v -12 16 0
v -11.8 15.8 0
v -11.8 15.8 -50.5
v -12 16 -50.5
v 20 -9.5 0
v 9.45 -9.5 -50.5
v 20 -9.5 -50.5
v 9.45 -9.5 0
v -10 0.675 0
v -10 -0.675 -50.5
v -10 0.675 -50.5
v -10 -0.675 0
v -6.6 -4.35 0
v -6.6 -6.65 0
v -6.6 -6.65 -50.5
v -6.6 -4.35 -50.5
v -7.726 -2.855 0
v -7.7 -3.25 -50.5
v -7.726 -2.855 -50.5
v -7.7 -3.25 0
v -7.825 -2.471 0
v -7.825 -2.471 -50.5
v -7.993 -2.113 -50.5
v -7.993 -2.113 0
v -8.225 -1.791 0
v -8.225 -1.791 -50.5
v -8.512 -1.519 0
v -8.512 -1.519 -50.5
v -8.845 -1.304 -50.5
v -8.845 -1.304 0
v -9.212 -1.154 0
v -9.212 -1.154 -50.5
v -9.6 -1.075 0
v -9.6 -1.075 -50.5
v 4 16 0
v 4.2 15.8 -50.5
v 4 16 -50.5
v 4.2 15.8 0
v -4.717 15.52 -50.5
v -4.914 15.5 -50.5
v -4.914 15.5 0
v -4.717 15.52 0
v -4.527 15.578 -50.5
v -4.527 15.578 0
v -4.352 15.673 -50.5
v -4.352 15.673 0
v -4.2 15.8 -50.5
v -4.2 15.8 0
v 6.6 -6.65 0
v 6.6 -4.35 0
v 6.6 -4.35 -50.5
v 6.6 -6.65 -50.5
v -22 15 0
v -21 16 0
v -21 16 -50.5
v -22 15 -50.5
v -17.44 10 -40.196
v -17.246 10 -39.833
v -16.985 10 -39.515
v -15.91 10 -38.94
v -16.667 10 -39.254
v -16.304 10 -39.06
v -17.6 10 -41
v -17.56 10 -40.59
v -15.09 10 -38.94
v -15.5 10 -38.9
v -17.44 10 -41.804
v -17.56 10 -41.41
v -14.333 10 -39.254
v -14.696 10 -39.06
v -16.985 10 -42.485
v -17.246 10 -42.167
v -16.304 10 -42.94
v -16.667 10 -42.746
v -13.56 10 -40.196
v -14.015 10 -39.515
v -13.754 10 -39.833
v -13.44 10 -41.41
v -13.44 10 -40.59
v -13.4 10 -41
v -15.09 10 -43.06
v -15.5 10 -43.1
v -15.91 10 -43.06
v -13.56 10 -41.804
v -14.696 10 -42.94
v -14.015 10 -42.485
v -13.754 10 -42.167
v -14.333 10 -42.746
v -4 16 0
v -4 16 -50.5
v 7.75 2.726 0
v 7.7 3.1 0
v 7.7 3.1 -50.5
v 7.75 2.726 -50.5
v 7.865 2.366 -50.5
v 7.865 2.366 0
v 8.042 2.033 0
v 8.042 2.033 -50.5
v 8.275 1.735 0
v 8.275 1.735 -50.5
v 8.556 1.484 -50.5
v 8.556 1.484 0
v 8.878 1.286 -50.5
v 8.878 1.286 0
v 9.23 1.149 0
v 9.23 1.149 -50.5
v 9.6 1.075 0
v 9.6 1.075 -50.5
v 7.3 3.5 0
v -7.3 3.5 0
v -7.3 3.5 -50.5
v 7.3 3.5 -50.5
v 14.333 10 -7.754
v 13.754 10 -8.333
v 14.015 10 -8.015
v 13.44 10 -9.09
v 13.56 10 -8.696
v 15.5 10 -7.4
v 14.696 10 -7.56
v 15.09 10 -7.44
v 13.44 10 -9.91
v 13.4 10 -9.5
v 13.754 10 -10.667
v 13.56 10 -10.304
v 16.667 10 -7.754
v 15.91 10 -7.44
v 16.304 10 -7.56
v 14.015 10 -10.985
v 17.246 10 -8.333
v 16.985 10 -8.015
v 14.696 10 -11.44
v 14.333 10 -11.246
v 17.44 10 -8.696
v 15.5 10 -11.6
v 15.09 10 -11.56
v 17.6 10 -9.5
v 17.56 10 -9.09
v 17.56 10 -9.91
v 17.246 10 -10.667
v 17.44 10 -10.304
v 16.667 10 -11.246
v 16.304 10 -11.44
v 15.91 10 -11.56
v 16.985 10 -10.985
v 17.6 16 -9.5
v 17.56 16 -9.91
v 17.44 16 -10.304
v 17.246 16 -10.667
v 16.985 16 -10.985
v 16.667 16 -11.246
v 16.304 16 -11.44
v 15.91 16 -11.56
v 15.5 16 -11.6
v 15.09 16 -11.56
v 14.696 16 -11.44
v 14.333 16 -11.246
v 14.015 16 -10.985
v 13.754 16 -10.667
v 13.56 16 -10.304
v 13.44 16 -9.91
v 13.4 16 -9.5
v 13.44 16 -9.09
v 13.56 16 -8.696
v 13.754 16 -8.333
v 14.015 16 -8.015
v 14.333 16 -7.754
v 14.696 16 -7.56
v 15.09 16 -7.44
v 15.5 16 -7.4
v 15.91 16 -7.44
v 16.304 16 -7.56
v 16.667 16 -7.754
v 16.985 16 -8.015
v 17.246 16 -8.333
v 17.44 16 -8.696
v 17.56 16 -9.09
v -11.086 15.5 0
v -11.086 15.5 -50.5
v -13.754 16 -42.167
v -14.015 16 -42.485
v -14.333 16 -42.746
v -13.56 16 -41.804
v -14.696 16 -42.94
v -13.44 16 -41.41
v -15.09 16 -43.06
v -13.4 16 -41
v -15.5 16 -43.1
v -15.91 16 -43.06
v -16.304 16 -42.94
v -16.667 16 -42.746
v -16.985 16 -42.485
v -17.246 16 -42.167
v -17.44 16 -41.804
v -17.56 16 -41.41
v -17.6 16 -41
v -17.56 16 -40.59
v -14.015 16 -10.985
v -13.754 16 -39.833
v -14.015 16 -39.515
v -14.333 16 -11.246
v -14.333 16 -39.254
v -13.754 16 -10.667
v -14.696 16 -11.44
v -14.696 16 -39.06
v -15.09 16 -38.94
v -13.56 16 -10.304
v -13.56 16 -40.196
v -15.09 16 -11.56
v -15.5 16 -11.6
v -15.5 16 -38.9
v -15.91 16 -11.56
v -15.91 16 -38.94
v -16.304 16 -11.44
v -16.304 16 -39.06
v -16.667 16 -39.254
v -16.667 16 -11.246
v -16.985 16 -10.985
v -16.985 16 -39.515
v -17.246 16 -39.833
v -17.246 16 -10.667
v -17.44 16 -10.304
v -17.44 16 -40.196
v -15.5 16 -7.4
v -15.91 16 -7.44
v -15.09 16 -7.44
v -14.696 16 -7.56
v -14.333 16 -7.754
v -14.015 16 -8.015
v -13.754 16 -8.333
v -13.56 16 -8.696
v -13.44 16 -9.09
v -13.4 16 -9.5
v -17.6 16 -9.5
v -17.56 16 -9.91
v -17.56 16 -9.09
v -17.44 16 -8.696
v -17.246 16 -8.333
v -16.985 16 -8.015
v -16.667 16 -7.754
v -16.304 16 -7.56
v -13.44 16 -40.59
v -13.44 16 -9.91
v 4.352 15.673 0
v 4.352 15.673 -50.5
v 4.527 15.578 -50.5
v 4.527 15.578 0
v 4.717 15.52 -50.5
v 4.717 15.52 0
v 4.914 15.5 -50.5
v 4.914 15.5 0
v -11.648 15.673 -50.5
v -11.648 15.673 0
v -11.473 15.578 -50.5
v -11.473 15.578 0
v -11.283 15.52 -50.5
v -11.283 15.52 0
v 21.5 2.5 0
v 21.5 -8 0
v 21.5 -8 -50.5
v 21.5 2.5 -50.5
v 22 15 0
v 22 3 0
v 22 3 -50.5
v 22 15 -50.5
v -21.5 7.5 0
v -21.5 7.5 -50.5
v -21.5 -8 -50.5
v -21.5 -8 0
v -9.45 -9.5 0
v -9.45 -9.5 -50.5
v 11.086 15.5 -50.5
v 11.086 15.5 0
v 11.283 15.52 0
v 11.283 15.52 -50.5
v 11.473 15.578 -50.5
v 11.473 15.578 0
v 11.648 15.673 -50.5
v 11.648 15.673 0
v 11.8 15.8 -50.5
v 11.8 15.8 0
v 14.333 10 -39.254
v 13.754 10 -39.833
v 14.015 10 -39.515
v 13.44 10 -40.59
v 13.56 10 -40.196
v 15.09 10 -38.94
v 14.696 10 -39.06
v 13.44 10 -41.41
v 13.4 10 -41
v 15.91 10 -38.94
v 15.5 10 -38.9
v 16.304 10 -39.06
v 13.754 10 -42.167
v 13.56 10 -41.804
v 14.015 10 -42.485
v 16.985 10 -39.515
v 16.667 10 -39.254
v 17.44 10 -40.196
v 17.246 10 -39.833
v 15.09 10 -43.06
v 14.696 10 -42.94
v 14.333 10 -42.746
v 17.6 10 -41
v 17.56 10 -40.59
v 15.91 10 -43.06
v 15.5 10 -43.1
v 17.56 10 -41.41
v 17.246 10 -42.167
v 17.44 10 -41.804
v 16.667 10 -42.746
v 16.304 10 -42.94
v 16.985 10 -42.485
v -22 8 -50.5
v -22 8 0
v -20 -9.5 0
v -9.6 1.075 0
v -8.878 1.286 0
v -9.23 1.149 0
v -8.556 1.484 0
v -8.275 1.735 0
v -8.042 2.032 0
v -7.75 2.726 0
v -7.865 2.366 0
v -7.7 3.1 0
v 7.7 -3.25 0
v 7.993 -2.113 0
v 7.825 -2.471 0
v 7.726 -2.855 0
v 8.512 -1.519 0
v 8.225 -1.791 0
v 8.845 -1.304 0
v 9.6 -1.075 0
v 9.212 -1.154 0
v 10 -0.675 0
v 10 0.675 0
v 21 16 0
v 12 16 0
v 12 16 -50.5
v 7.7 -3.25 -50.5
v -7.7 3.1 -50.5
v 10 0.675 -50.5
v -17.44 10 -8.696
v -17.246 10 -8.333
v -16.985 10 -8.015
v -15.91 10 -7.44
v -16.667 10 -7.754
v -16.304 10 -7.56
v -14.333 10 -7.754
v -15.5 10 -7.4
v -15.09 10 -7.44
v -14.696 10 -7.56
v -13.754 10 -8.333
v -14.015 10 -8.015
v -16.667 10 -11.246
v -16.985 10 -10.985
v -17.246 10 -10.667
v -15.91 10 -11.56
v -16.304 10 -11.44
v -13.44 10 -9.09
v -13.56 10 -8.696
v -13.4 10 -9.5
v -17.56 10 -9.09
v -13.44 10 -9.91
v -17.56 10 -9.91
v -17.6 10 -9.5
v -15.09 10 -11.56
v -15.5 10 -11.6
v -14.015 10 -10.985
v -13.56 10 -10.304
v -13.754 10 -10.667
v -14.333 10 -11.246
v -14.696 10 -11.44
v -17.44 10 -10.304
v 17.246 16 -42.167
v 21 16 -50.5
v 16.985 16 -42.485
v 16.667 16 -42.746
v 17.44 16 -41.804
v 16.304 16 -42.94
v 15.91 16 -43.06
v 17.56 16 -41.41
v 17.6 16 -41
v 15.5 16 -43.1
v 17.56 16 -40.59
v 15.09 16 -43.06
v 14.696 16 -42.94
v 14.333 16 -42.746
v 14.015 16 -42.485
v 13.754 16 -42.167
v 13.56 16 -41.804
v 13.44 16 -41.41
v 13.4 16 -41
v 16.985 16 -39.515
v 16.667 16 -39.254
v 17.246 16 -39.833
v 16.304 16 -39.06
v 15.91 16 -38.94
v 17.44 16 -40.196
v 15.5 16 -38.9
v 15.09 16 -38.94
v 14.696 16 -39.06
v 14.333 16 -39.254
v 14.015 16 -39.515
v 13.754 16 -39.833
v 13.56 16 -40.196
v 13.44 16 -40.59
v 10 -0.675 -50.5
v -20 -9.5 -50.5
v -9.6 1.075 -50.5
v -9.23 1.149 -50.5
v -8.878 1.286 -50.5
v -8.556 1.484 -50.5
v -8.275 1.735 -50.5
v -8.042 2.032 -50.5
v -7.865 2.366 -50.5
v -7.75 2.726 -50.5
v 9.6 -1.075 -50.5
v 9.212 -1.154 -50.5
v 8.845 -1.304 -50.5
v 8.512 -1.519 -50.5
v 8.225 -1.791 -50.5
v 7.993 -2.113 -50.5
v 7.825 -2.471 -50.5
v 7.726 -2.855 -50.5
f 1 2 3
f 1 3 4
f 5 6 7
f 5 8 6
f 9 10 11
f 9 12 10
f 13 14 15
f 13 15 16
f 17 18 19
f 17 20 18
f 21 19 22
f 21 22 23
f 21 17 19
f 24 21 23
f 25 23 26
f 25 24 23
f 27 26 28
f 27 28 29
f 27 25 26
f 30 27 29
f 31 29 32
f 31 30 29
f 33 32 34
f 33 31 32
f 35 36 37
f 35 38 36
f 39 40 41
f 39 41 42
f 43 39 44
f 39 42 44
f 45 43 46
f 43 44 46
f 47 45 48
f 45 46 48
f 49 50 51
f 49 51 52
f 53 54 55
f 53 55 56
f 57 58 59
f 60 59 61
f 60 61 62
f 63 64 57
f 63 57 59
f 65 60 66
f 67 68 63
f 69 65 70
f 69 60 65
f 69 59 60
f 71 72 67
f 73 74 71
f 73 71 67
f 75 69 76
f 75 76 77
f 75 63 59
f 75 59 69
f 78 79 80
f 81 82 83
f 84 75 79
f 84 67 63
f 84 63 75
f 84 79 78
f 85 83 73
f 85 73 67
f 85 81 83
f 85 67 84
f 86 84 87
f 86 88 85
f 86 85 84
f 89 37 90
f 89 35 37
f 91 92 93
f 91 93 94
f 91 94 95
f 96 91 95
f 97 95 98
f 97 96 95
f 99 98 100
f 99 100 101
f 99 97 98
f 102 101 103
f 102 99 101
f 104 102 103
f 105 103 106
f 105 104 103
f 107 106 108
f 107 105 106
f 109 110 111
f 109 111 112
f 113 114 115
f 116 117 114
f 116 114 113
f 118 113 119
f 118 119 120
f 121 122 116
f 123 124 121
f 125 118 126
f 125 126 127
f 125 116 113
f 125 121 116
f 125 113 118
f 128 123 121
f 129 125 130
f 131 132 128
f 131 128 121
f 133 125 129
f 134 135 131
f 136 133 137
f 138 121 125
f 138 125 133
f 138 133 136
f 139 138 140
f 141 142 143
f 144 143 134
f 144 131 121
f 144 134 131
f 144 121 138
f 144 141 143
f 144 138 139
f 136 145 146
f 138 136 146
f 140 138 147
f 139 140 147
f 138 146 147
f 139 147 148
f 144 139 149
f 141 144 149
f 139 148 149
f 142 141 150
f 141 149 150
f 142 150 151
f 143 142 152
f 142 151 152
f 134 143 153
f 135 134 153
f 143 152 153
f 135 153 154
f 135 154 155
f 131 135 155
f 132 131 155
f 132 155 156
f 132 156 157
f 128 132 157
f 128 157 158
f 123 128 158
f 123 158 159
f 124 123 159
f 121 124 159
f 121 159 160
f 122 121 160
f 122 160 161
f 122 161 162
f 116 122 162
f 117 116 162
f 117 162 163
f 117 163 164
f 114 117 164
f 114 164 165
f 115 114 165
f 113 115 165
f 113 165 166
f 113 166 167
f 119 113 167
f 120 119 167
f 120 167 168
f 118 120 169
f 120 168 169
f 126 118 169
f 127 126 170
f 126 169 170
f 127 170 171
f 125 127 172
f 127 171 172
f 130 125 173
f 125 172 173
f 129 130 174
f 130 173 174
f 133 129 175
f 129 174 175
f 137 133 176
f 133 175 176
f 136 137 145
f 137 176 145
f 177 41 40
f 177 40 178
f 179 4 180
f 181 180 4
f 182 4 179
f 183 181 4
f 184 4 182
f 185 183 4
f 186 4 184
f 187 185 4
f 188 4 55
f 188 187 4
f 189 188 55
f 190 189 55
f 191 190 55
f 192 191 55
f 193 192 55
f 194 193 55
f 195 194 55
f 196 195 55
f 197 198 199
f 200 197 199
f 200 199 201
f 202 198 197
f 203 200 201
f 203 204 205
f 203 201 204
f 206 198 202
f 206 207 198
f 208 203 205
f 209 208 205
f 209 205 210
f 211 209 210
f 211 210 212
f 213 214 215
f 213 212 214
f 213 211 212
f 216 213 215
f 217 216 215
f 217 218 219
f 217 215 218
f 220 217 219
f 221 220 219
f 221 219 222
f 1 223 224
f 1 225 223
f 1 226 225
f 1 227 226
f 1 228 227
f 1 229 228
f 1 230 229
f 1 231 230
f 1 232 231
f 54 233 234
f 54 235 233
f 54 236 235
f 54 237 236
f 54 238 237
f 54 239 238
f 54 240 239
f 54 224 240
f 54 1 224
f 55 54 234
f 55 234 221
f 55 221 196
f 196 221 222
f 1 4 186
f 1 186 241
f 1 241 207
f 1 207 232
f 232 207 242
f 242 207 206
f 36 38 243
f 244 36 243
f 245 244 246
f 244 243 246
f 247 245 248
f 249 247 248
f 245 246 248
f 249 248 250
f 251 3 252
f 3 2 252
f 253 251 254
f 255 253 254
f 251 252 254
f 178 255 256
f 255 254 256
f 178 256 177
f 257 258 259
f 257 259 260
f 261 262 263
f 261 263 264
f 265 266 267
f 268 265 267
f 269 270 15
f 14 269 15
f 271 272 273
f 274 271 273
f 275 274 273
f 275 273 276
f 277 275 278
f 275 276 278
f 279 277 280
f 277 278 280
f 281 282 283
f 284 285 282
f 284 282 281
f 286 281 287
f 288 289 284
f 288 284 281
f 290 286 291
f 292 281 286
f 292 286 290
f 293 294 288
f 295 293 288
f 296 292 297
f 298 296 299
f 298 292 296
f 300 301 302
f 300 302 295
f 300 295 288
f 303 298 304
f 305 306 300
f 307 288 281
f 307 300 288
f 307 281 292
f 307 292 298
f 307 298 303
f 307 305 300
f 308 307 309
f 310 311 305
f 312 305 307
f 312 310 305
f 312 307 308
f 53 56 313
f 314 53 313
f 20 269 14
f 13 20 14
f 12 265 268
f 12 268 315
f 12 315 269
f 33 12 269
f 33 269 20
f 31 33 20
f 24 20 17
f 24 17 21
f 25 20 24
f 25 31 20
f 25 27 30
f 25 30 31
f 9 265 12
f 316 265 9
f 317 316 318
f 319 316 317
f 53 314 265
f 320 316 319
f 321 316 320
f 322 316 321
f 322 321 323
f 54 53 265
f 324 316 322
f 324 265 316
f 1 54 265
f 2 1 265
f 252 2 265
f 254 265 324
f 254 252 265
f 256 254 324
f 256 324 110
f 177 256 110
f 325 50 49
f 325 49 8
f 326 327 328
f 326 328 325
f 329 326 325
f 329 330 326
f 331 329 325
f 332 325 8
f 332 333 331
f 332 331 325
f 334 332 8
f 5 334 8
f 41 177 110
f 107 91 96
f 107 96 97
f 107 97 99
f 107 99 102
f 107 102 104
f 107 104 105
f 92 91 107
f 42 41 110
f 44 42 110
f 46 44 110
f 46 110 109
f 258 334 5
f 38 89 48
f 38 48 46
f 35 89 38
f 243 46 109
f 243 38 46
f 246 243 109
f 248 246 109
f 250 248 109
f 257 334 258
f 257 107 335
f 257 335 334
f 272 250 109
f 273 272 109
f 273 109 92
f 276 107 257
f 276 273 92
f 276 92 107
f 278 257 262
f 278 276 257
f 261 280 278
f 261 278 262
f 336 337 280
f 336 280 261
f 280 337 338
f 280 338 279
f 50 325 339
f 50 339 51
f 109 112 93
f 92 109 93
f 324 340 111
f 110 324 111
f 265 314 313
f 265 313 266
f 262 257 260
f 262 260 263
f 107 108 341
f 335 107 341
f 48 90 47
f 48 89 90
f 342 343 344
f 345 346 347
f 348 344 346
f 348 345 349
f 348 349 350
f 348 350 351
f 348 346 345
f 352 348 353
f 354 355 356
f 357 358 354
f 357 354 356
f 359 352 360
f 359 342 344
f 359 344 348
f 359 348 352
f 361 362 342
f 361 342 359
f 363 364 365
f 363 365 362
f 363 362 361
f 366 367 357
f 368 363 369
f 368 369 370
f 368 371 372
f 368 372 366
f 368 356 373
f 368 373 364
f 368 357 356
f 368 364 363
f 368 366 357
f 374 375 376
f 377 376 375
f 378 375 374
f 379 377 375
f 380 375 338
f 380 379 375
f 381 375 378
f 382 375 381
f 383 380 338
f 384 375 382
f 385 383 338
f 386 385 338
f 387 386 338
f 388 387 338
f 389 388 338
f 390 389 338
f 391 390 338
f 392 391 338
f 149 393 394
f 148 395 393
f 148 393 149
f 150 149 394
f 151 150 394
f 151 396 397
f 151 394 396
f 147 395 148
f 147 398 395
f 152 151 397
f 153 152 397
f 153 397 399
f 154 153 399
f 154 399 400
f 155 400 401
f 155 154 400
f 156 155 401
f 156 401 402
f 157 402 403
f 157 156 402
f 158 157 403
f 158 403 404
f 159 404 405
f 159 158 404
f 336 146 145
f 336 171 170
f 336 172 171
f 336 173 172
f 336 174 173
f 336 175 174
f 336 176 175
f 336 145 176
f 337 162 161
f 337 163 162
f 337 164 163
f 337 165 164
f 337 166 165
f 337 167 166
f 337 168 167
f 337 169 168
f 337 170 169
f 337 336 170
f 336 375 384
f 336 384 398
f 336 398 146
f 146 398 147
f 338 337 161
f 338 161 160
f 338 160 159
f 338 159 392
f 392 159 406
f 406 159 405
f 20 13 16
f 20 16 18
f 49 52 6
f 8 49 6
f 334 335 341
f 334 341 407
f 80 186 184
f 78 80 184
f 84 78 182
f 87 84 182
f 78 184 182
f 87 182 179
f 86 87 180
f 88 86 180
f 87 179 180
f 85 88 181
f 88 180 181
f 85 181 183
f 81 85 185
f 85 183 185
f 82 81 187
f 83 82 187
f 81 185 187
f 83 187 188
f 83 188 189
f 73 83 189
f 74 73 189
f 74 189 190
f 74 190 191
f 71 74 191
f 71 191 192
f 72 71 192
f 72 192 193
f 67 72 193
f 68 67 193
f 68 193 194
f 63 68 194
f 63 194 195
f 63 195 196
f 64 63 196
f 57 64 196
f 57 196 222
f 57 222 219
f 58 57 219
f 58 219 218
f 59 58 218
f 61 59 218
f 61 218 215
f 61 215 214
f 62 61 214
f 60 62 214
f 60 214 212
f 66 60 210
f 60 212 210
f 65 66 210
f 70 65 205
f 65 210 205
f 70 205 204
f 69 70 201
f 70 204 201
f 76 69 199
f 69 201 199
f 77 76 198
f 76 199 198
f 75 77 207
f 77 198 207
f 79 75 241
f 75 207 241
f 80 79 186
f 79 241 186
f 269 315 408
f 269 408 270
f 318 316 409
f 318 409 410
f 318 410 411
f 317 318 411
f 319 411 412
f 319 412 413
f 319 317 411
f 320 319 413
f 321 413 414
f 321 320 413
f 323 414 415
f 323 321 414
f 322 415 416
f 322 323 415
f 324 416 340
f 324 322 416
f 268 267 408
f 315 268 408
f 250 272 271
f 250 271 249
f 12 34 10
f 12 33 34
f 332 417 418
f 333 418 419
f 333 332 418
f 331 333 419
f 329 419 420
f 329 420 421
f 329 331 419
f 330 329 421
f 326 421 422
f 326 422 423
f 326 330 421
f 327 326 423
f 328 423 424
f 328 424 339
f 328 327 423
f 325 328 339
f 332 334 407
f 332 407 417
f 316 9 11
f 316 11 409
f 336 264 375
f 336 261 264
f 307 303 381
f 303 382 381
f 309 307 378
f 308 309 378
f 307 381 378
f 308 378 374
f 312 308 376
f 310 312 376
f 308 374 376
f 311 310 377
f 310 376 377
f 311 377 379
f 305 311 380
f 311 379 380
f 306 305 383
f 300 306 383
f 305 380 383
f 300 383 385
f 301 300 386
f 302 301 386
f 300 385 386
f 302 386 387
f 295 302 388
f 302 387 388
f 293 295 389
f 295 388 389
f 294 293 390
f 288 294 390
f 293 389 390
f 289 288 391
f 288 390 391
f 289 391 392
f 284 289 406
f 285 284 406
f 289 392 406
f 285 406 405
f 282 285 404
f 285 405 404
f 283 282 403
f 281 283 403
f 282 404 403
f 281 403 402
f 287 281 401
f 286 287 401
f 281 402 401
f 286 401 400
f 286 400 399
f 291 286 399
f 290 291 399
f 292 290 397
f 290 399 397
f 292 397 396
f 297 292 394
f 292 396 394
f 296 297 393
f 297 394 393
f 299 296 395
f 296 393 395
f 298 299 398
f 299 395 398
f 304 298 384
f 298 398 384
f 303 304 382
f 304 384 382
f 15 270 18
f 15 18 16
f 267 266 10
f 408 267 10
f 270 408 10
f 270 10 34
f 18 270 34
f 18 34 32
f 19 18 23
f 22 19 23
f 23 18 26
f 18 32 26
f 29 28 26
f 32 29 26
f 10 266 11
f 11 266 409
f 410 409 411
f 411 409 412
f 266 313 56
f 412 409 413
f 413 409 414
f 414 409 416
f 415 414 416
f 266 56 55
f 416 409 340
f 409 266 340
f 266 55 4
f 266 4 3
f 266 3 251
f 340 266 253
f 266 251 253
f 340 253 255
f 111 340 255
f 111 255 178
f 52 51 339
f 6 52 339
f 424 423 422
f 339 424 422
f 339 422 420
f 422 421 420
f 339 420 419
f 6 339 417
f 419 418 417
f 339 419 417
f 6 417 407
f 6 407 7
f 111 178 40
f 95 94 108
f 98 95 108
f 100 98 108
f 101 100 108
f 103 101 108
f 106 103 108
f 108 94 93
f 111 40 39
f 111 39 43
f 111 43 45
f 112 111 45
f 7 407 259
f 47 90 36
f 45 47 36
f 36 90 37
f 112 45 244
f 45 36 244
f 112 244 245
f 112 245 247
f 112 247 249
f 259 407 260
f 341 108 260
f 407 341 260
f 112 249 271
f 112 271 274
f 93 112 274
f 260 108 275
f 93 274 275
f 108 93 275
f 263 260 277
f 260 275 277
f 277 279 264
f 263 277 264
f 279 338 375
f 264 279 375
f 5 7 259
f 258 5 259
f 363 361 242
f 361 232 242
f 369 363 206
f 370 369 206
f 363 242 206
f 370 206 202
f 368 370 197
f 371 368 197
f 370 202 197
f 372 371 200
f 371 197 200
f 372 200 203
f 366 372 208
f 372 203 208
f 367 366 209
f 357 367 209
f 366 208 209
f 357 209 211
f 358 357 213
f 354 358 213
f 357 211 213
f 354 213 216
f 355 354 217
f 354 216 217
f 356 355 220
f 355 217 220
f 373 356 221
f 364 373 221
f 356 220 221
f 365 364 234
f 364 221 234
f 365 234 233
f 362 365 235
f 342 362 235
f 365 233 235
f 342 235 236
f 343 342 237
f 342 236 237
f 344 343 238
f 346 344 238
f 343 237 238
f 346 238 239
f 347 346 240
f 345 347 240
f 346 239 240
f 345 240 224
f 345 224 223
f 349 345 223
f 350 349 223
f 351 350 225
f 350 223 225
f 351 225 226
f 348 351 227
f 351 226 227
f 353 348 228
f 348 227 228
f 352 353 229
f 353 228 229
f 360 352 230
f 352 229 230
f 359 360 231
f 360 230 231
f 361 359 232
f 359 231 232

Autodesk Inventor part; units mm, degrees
ref_plane "YZ Plane" through (0, 0, 0) normal (1, 0, 0) x (0, 1, 0)
ref_plane "XZ Plane" through (0, 0, 0) normal (0, 1, 0) x (-1, 0, 0)
ref_plane "XY Plane" through (0, 0, 0) normal (0, 0, 1) x (1, 0, 0)
sketch "Sketch1" plane through (0, 0, 0) normal (0, 0, 1) x (1, 0, 0)
  line L0 (-22, 15) -> (-22, 8)
  line L1 (-21, 16) -> (-22, 15)
  line L2 (-12, 16) -> (-21, 16)
  line L3 (-11.8, 15.8) -> (-12, 16)
  arc A0 (-11.8, 15.8) -> (-11.0859, 15.5) centre (-11.0859, 16.5) ccw
  line L4 (-4.9141, 15.5) -> (-11.0859, 15.5)
  arc A1 (-4.9141, 15.5) -> (-4.2, 15.8) centre (-4.9141, 16.5) ccw
  line L5 (-4, 16) -> (-4.2, 15.8)
  line L6 (4, 16) -> (-4, 16)
  line L7 (4.2, 15.8) -> (4, 16)
  arc A2 (4.2, 15.8) -> (4.9141, 15.5) centre (4.9141, 16.5) ccw
  line L8 (11.0859, 15.5) -> (4.9141, 15.5)
  arc A3 (11.0859, 15.5) -> (11.8, 15.8) centre (11.0859, 16.5) ccw
  line L9 (12, 16) -> (11.8, 15.8)
  line L10 (21, 16) -> (12, 16)
  line L11 (22, 15) -> (21, 16)
  line L12 (22, 3) -> (22, 15)
  line L13 (21.5, 2.5) -> (22, 3)
  line L14 (21.5, -8) -> (21.5, 2.5)
  line L15 (20, -9.5) -> (21.5, -8)
  line L16 (9.45, -9.5) -> (20, -9.5)
  line L17 (6.6, -6.65) -> (9.45, -9.5)
  line L18 (6.6, -4.35) -> (6.6, -6.65)
  line L19 (7.7, -3.25) -> (6.6, -4.35)
  arc A4 (9.6, -1.075) -> (7.7, -3.25) centre (9.8292, -3.1926) ccw
  line L20 (10, -0.675) -> (9.6, -1.075)
  line L21 (10, 0.675) -> (10, -0.675)
  line L22 (9.6, 1.075) -> (10, 0.675)
  arc A5 (7.7, 3.1) -> (9.6, 1.075) centre (9.828, 3.1928) ccw
  line L23 (7.3, 3.5) -> (7.7, 3.1)
  line L24 (-7.3, 3.5) -> (7.3, 3.5)
  line L25 (-7.7, 3.1) -> (-7.3, 3.5)
  arc A6 (-9.6, 1.075) -> (-7.7, 3.1) centre (-9.828, 3.1928) ccw
  line L26 (-10, 0.675) -> (-9.6, 1.075)
  line L27 (-10, -0.675) -> (-10, 0.675)
  line L28 (-9.6, -1.075) -> (-10, -0.675)
  arc A7 (-7.7, -3.25) -> (-9.6, -1.075) centre (-9.8292, -3.1926) ccw
  line L29 (-6.6, -4.35) -> (-7.7, -3.25)
  line L30 (-6.6, -6.65) -> (-6.6, -4.35)
  line L31 (-9.45, -9.5) -> (-6.6, -6.65)
  line L32 (-20, -9.5) -> (-9.45, -9.5)
  line L33 (-21.5, -8) -> (-20, -9.5)
  line L34 (-21.5, 7.5) -> (-21.5, -8)
  line L35 (-22, 8) -> (-21.5, 7.5)
  point P0 (0, 0)
  point P1 (0, 0)
extrude "Extrusion1" add sketch "Sketch1" against normal blind 50.5
sketch "Sketch3" plane through (-21, 16, 0) normal (0, 1, 0) x (1, 0, 0)
  circle A0 centre (5.5, 41) radius 2.1
  circle A1 centre (36.5, 41) radius 2.1
  line L0 (9, 0) -> (0, 0) projected
  line L1 (9, 0) -> (9, 50.5) projected
  line L2 (0, 50.5) -> (9, 50.5) projected
  line L3 (0, 0) -> (0, 50.5) projected
  line L4 (42, 0) -> (33, 0) projected
  line L5 (42, 0) -> (42, 50.5) projected
  line L6 (33, 50.5) -> (42, 50.5) projected
  line L7 (33, 0) -> (33, 50.5) projected
  line L8 (42, 0) -> (33, 0) projected
  line L9 (4.5, 0) -> (4.5, 50.5) construction
  line L10 (0, 50.5) -> (9, 50.5) projected
  line L11 (0, 0) -> (0, 50.5) projected
  line L12 (0, 25.25) -> (42, 25.25) construction
  line L13 (42, 0) -> (42, 50.5) projected
  line L14 (21, 0) -> (21, 50.5) construction
  circle A2 centre (5.5, 9.5) radius 2.1
  circle A3 centre (36.5, 9.5) radius 2.1
  point P0 (19, 27.5)
  dimension "d5" = 31
  dimension "d6" = 4.2
  dimension "d7" = 15.75
extrude "Extrusion2" cut sketch "Sketch3" against normal blind 6 contours A0 | A1 | A2 | A3
properties part number "HGR20A"
